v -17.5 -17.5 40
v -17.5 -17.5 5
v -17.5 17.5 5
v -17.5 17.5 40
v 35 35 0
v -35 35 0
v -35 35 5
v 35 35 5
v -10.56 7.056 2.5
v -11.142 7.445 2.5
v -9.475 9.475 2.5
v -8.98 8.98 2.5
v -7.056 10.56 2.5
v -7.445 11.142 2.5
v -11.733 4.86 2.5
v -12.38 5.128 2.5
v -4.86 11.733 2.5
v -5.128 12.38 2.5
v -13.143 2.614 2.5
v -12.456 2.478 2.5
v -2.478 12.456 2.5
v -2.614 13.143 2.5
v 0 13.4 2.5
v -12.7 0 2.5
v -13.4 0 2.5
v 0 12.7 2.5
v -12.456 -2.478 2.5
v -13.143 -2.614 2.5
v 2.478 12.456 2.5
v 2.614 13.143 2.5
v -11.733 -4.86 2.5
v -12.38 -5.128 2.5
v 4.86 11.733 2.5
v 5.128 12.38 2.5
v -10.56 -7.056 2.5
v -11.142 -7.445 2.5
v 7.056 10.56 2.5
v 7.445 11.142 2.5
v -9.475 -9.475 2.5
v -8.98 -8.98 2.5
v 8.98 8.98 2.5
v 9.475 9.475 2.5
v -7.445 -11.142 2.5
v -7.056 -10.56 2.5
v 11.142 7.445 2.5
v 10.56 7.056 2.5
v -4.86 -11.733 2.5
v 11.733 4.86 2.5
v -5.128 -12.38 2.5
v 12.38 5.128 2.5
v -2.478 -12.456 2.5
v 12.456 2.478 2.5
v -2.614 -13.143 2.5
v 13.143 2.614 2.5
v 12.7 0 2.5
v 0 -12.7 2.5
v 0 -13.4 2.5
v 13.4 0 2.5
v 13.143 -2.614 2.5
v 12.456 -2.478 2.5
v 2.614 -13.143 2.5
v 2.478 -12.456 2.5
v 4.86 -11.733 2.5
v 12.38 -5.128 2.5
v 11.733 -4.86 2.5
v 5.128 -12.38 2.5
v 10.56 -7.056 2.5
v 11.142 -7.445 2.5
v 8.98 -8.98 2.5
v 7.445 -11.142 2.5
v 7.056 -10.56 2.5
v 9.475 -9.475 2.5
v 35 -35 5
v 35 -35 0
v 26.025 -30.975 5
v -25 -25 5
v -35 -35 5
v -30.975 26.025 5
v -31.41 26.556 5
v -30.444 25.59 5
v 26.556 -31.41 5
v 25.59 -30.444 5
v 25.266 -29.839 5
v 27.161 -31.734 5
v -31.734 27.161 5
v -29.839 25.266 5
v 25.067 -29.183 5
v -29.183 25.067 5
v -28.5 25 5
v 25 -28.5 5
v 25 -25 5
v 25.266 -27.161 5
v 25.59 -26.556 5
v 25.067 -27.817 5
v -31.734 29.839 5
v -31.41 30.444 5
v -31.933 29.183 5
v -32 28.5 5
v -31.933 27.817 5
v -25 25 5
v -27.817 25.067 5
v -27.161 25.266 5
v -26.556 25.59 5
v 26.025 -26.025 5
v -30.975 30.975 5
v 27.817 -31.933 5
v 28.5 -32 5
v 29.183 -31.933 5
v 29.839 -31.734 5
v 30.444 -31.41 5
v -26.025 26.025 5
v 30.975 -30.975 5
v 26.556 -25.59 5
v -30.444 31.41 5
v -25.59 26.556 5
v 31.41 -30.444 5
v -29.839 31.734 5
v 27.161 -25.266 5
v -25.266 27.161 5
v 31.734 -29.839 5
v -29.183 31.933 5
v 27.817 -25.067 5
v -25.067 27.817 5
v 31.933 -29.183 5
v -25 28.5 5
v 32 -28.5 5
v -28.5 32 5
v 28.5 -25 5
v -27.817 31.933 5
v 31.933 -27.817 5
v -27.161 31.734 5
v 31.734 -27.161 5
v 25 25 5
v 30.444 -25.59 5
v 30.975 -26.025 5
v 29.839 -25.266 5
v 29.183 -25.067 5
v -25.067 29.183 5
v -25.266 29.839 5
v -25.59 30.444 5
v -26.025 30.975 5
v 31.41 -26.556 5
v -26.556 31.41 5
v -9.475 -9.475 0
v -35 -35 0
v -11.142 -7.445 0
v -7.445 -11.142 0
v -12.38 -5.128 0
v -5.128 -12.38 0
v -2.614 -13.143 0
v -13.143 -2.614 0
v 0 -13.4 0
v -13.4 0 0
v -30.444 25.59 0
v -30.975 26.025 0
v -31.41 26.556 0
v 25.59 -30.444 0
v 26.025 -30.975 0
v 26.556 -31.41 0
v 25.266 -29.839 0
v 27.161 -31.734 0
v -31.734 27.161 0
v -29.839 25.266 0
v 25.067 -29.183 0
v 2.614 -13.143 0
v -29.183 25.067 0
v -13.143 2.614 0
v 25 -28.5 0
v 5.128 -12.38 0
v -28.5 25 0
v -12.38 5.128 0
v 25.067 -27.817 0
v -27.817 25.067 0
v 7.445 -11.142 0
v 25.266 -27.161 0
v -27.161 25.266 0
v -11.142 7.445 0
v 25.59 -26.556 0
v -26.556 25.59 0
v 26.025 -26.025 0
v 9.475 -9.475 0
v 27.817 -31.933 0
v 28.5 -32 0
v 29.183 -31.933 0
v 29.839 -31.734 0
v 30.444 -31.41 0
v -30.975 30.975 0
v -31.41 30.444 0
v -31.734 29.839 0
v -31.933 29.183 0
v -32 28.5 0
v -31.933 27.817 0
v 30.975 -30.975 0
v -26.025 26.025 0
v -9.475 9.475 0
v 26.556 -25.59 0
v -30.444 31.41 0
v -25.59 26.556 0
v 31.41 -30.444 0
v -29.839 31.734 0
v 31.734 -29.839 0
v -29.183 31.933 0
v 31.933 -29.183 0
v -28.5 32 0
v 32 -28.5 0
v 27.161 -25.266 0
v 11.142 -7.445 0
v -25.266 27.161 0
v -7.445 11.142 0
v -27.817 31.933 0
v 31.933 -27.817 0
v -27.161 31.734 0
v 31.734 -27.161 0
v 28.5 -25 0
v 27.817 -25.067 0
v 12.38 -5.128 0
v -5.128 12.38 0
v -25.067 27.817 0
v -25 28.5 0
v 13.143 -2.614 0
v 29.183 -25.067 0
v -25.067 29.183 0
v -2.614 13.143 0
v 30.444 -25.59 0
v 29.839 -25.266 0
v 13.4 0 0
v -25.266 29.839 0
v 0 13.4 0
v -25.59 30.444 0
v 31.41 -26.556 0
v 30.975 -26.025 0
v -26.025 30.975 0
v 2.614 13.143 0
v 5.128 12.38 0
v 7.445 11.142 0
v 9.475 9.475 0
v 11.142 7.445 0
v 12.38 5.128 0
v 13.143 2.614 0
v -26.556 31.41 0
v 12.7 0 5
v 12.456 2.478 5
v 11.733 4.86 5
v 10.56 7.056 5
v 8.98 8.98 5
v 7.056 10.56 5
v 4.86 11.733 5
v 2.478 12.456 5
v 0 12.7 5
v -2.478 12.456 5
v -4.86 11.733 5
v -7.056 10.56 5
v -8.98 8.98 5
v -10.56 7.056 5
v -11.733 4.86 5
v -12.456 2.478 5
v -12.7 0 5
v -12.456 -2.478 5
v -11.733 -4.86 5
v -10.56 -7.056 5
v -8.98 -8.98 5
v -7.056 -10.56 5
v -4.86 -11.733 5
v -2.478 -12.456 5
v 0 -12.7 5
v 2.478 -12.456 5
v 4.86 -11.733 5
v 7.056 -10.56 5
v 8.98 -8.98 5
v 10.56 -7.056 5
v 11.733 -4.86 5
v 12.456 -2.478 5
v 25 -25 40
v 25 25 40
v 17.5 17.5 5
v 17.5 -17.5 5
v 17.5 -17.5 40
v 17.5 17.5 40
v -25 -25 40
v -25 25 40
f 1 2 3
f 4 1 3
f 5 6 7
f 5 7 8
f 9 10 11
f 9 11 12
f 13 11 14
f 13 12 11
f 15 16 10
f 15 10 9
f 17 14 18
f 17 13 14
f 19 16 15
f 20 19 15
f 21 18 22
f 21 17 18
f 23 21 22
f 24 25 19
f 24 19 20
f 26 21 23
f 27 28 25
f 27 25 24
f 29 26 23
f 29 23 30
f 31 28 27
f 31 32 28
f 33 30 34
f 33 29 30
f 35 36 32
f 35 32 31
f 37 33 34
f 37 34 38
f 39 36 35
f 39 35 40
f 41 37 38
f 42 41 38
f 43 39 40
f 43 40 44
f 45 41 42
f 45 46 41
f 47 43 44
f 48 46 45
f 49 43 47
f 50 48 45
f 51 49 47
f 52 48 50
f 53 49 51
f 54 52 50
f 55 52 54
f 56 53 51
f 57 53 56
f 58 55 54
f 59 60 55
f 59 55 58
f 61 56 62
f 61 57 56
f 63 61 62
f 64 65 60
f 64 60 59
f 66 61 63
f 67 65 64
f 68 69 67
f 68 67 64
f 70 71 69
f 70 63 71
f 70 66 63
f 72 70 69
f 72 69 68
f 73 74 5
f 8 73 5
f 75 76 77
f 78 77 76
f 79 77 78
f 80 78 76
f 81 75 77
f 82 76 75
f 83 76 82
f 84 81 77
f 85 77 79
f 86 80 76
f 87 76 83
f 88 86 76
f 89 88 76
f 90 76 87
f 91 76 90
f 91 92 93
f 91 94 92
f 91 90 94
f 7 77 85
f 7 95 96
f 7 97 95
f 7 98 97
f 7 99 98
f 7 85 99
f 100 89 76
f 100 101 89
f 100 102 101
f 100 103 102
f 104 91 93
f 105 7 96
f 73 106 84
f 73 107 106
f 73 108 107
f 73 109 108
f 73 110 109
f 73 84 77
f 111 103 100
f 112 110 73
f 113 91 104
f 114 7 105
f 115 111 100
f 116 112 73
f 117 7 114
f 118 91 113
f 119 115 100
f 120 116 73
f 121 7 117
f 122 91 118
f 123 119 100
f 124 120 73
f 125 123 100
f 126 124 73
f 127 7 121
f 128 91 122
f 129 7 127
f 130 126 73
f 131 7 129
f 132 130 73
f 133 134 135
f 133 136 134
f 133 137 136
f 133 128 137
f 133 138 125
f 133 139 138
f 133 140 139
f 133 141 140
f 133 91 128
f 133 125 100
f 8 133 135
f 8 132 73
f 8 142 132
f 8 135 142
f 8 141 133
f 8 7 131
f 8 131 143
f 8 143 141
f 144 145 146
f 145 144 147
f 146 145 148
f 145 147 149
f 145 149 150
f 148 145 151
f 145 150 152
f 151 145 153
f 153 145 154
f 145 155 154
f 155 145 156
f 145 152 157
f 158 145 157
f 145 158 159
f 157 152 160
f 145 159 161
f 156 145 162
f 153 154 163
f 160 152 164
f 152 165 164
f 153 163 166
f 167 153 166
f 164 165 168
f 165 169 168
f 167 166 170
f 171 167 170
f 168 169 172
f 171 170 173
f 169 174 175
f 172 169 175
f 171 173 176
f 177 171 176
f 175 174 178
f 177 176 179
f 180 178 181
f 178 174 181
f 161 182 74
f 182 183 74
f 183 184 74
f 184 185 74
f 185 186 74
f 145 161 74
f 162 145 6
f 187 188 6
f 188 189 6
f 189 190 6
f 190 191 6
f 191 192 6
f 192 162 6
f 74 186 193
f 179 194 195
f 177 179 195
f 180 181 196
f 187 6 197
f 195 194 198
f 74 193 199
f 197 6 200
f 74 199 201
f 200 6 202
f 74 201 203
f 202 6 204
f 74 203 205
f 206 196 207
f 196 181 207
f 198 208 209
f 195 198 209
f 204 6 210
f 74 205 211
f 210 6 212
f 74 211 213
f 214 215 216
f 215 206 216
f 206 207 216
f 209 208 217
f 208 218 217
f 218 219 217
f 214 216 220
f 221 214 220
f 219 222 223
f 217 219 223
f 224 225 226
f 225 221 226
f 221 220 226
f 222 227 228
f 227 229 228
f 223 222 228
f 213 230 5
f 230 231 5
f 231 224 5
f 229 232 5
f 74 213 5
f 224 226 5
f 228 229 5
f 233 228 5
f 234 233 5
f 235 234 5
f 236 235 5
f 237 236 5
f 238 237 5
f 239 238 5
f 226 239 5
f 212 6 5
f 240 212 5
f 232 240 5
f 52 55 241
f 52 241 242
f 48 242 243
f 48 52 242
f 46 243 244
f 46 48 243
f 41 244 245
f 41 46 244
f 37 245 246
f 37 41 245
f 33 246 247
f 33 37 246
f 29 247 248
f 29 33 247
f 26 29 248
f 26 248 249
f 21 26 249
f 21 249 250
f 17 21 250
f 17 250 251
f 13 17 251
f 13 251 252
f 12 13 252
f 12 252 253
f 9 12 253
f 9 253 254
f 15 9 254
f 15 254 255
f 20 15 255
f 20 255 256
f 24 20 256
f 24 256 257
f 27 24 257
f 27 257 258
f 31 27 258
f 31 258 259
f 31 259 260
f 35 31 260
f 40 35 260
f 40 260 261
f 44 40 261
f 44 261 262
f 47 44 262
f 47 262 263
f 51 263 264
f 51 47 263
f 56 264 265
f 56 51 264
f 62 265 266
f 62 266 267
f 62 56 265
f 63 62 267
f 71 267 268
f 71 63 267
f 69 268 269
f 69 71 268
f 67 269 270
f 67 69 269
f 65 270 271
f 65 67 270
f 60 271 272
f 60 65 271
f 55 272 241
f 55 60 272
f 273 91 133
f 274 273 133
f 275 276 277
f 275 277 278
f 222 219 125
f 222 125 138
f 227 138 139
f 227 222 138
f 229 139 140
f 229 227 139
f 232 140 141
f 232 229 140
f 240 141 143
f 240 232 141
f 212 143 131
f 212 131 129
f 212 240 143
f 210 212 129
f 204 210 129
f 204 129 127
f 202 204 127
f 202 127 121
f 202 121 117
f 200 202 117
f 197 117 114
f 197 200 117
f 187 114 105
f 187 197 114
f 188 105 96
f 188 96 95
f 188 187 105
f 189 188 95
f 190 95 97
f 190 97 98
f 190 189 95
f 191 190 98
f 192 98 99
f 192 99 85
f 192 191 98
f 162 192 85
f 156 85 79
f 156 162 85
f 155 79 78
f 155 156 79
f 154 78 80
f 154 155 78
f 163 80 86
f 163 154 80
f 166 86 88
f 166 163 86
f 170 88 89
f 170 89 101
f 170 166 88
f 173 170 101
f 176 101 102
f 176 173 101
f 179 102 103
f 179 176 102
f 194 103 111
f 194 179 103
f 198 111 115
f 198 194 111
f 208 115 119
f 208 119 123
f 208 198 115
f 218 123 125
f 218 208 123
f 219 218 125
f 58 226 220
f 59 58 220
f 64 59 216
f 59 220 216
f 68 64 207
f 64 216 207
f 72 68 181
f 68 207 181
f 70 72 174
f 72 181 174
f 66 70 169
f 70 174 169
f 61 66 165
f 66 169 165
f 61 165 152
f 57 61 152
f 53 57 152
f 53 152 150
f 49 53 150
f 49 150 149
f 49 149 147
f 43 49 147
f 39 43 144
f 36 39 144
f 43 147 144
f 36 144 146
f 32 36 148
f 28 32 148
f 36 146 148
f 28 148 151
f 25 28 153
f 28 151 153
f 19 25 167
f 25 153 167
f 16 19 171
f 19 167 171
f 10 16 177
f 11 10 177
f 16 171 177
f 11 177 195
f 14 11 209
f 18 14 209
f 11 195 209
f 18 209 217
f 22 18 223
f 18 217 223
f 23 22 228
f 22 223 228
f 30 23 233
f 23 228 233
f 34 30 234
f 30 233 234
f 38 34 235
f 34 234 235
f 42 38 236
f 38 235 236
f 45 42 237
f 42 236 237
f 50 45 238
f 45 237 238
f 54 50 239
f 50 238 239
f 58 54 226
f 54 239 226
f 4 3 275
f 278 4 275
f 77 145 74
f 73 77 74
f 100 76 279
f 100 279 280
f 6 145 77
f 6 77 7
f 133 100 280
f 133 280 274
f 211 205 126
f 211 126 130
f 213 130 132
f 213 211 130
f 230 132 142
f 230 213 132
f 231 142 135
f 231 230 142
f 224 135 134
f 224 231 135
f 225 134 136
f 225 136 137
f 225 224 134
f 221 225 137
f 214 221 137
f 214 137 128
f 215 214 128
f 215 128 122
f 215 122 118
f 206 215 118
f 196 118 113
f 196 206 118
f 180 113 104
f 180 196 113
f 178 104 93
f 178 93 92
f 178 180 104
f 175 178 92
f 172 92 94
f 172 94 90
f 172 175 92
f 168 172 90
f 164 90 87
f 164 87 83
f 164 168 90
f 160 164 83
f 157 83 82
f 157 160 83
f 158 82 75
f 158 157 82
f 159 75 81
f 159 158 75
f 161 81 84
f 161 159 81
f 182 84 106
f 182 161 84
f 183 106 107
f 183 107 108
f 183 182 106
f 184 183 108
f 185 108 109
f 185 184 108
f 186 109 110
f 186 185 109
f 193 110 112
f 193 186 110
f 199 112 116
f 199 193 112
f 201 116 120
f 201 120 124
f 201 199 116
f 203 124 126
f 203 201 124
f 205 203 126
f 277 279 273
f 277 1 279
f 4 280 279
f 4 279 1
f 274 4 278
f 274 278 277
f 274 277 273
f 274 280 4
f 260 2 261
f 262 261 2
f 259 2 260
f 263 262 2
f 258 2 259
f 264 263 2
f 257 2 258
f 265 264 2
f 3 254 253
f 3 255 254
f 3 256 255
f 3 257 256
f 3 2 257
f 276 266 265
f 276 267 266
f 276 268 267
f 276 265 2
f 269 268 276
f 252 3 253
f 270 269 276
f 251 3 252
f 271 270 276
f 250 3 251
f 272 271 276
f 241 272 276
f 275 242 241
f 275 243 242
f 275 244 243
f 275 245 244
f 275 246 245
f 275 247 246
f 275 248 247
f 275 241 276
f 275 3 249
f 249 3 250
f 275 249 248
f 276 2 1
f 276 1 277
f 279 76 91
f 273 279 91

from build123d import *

# Parameters (mm, degrees)
F0_W     = 70
F0_H     = 70
F0_R     = 3.5
F0_R_2   = 12.7
F1_DEPTH = 5
F2_W     = 50
F2_H     = 50
F2_W_2   = 35
F2_H_2   = 35
F3_DEPTH = 35
F4_R     = 13.4
F4_R_2   = 12.7
F5_DEPTH = 2.5


# Not quite as in the source:
# - a feature names something its author has since deleted; it is built from what else it names


with BuildPart() as f1:
    # F0 (on Top) → F1 (new body)
    with BuildSketch(Plane.XY):
        Rectangle(F0_W, F0_H)
        with Locations((28.5, -28.5)):
            Circle(F0_R, mode=Mode.SUBTRACT)
        with Locations((-28.5, 28.5)):
            Circle(F0_R, mode=Mode.SUBTRACT)
        Circle(F0_R_2, mode=Mode.SUBTRACT)
    extrude(amount=F1_DEPTH)

    # F2 (on face) → F3 (join)
    with BuildSketch(Plane.XY.offset(5)):
        Rectangle(F2_W, F2_H)
        Rectangle(F2_W_2, F2_H_2, mode=Mode.SUBTRACT)
    extrude(amount=F3_DEPTH)

    # F4 (on face) → F5 (cut)
    with BuildSketch(Plane(origin=(0, 0, 0), x_dir=(1, 0, 0), z_dir=(0, 0, -1))):
        Circle(F4_R)
        Circle(F4_R_2, mode=Mode.SUBTRACT)
    extrude(amount=-F5_DEPTH, mode=Mode.SUBTRACT)


solid = f1.part
